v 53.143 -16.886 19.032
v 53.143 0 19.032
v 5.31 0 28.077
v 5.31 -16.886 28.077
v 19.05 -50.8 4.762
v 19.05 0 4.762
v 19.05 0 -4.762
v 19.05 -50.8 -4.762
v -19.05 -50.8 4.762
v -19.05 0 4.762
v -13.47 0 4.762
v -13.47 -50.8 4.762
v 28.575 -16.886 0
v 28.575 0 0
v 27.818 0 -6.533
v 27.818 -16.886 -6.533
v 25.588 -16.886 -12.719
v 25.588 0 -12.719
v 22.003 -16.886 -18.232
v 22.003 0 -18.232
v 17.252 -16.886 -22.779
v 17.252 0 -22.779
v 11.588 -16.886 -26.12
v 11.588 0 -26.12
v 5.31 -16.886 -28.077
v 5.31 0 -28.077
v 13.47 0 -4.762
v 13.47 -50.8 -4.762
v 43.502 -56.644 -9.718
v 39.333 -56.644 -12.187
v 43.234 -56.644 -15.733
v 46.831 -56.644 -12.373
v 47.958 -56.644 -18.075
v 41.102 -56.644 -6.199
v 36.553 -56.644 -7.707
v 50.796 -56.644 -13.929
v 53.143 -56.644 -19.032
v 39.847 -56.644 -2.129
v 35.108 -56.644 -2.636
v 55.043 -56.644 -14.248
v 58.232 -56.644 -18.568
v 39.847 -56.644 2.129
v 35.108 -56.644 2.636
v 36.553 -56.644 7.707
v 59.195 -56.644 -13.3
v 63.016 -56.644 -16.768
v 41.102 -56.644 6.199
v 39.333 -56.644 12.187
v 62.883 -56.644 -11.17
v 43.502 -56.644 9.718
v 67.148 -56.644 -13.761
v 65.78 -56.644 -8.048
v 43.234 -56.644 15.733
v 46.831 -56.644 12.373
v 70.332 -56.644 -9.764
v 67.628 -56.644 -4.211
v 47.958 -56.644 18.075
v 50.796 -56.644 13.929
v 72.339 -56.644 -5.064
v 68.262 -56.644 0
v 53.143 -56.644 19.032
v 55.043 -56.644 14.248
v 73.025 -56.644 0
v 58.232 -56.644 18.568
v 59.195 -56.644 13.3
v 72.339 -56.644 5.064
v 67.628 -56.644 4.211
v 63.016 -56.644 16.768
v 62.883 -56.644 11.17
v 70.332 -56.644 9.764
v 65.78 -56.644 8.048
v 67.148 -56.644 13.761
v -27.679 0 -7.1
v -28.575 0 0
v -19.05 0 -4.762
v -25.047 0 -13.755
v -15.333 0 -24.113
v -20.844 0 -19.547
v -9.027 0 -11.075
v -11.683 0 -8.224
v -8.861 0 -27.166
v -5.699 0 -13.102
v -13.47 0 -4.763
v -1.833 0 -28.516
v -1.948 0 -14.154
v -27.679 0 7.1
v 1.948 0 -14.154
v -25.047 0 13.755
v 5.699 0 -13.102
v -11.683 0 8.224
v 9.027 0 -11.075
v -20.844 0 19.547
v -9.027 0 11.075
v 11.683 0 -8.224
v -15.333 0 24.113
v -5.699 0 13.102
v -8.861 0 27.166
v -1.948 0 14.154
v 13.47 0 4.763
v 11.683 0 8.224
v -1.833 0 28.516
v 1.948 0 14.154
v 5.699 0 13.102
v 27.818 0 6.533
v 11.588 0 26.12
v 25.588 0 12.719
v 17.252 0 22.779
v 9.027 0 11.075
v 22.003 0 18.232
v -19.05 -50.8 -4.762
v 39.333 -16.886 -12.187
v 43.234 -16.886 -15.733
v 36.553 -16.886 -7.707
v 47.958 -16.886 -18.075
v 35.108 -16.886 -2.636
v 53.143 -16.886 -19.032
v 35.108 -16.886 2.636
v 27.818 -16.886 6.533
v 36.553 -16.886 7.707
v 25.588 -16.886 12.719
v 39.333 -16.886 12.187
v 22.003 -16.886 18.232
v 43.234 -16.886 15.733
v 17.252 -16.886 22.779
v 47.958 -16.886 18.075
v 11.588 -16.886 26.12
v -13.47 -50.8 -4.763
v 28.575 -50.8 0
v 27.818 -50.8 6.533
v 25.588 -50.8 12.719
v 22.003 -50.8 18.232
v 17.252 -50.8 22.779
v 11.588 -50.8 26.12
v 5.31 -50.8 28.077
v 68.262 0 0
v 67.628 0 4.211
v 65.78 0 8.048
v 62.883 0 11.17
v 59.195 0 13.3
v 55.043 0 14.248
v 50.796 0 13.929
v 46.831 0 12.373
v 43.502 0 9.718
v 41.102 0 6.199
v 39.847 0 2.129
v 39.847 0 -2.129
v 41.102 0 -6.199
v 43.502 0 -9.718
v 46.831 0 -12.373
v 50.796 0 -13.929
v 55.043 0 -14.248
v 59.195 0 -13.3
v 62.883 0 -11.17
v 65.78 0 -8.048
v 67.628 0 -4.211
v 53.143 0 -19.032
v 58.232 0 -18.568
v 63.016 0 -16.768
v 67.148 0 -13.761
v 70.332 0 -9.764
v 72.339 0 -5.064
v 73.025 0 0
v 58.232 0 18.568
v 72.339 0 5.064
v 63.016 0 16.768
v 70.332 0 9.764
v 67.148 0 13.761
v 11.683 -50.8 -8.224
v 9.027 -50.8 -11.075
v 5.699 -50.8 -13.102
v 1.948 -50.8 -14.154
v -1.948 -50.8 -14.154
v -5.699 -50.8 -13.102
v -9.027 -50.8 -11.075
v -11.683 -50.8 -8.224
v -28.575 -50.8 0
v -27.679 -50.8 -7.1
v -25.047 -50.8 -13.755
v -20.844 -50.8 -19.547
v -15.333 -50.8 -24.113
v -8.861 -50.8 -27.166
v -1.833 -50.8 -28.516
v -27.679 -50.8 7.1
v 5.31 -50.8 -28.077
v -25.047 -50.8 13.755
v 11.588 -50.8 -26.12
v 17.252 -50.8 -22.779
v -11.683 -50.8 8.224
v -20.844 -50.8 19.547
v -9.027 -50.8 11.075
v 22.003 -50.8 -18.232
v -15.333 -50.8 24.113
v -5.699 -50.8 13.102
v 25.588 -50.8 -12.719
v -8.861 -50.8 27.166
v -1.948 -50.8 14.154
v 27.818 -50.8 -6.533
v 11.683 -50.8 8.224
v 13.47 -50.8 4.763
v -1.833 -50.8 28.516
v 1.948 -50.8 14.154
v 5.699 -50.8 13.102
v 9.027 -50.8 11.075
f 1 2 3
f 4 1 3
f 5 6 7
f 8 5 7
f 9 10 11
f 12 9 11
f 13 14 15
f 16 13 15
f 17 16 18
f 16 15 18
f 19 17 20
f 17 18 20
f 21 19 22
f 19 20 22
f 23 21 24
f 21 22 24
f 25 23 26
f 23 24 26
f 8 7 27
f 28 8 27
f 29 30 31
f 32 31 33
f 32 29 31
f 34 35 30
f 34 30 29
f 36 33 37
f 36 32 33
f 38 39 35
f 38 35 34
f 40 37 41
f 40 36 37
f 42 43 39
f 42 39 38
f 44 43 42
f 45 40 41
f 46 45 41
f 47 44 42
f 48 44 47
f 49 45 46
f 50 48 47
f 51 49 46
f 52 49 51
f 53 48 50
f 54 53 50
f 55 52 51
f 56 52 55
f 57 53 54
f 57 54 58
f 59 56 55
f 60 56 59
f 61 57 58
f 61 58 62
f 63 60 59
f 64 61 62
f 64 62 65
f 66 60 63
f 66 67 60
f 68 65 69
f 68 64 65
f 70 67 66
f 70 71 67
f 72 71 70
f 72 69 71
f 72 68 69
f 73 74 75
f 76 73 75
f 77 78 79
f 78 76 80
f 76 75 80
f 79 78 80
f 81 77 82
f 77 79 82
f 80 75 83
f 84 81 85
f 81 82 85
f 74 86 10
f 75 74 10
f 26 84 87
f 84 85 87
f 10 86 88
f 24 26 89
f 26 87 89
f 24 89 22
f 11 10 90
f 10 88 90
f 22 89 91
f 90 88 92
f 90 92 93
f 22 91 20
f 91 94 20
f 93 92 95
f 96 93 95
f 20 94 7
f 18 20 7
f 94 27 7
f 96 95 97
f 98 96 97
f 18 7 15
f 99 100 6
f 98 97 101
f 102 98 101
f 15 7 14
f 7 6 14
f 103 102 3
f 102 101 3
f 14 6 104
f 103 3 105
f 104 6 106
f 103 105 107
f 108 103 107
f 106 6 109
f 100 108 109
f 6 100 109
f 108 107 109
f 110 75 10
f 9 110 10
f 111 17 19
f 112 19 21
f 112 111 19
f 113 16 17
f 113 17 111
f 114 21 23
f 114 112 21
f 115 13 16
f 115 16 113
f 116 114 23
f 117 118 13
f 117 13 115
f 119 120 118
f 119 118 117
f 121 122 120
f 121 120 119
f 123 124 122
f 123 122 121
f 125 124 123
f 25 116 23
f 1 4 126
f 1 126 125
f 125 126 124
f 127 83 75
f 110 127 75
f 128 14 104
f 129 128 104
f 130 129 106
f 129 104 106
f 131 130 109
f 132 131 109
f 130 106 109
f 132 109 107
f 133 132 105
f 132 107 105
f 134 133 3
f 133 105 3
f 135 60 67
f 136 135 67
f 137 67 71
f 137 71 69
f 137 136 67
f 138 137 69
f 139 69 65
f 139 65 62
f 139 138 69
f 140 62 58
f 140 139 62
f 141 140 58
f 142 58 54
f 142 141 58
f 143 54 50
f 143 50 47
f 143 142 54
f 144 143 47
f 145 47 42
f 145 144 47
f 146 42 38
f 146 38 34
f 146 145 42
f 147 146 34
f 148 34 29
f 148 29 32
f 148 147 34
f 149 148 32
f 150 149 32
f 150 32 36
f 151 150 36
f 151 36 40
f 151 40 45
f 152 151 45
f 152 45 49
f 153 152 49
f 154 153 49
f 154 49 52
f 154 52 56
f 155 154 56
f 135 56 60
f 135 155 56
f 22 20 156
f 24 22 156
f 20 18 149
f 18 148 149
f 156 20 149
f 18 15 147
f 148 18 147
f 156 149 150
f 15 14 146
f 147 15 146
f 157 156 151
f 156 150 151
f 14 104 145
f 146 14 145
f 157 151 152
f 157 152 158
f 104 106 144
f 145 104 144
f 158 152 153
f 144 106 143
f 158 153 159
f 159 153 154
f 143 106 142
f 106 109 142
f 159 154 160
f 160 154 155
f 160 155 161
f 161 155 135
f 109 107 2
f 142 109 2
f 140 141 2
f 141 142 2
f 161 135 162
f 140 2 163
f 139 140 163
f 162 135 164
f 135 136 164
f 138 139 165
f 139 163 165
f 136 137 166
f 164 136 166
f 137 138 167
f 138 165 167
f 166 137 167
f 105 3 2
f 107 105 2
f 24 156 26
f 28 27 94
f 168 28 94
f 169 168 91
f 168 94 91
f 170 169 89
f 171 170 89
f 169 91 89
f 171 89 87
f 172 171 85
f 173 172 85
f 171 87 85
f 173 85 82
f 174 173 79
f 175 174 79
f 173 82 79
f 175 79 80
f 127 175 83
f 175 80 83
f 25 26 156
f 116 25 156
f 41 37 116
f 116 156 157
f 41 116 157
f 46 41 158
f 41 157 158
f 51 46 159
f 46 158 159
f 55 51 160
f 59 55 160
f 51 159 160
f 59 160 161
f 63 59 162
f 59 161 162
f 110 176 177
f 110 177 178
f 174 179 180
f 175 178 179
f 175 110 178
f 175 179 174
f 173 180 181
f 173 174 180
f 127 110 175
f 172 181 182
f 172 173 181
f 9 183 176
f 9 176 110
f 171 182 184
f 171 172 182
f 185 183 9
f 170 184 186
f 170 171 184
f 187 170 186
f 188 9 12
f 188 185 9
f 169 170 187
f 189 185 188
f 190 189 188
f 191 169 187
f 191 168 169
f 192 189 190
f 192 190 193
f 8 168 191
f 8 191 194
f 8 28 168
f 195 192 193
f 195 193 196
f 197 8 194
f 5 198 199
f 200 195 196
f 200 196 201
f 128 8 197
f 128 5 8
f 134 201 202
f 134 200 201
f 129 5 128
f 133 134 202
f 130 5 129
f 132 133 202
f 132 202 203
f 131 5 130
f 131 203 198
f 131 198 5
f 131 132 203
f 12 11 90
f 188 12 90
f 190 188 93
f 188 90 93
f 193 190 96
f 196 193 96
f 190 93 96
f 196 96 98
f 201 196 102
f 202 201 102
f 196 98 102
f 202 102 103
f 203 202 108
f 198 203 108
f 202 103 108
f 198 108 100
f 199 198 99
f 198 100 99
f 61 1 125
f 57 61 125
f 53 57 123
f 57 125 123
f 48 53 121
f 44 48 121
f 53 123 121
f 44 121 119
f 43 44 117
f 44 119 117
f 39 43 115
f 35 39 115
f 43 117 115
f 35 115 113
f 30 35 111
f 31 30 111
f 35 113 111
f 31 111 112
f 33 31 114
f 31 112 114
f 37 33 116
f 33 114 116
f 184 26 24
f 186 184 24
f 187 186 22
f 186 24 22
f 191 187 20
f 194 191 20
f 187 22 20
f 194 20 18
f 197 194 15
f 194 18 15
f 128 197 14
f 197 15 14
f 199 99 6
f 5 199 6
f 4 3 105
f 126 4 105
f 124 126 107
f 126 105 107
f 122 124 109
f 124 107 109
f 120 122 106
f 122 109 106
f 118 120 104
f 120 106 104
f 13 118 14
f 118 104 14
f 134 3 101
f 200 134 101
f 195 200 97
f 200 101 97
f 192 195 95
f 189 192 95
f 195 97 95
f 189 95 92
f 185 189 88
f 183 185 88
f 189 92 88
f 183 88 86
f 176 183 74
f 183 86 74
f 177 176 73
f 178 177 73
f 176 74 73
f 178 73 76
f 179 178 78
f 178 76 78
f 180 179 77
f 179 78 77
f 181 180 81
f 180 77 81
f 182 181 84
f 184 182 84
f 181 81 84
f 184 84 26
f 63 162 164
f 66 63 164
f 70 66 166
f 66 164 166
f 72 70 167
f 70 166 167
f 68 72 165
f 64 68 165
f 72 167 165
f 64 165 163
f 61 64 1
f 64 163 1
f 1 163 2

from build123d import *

# Parameters (mm, degrees)
F1_DEPTH = 50.8
F2_DEPTH = 16.88607
F0_R     = 14.2875
F3_DEPTH = 56.64394


with BuildPart() as f1:
    # F0 (on Front) → F1 (new body)
    with BuildSketch(Plane.XZ):
        with BuildLine():
            ThreePointArc((5.309582, -28.077375), (22.002863, -18.231968), (28.575, 0))
            ThreePointArc((28.575, 0), (22.002863, 18.231968), (5.309582, 28.077375))
            ThreePointArc((5.309582, 28.077375), (-28.575, 0), (5.309582, -28.077375))
        make_face()
        with BuildLine():
            ThreePointArc((-13.470384, 4.7625), (0, 14.2875), (13.470384, 4.7625))
            Line((13.470384, 4.7625), (19.05, 4.7625))
            Line((19.05, 4.7625), (19.05, -4.7625))
            Line((19.05, -4.7625), (13.470384, -4.7625))
            ThreePointArc((13.470384, -4.7625), (0, -14.2875), (-13.470384, -4.7625))
            Line((-13.470384, -4.7625), (-19.05, -4.7625))
            Line((-19.05, -4.7625), (-19.05, 4.7625))
            Line((-19.05, 4.7625), (-13.470384, 4.7625))
        make_face(mode=Mode.SUBTRACT)
    extrude(amount=F1_DEPTH)


with BuildPart() as f2:
    # F0 (on Front) → F2 (new body)
    with BuildSketch(Plane.XZ):
        with BuildLine():
            ThreePointArc((5.309582, 28.077375), (22.002863, 18.231968), (28.575, 0))
            ThreePointArc((28.575, 0), (22.002863, -18.231968), (5.309582, -28.077375))
            Line((5.309582, -28.077375), (53.142986, -19.031822))
            ThreePointArc((53.142986, -19.031822), (34.925, 0), (53.142986, 19.031822))
            Line((53.142986, 19.031822), (5.309582, 28.077375))
        make_face()
    extrude(amount=F2_DEPTH)

    # F0 (on Front) → F3 (join)
    with BuildSketch(Plane.XZ):
        with BuildLine():
            ThreePointArc((73.025, 0), (67.147939, 13.761402), (53.142986, 19.031822))
            ThreePointArc((53.142986, 19.031822), (34.925, 0), (53.142986, -19.031822))
            ThreePointArc((53.142986, -19.031822), (67.147939, -13.761402), (73.025, 0))
        make_face()
        with Locations((53.975, 0)):
            Circle(F0_R, mode=Mode.SUBTRACT)
    extrude(amount=F3_DEPTH)


solid = Compound([f1.part, f2.part])
